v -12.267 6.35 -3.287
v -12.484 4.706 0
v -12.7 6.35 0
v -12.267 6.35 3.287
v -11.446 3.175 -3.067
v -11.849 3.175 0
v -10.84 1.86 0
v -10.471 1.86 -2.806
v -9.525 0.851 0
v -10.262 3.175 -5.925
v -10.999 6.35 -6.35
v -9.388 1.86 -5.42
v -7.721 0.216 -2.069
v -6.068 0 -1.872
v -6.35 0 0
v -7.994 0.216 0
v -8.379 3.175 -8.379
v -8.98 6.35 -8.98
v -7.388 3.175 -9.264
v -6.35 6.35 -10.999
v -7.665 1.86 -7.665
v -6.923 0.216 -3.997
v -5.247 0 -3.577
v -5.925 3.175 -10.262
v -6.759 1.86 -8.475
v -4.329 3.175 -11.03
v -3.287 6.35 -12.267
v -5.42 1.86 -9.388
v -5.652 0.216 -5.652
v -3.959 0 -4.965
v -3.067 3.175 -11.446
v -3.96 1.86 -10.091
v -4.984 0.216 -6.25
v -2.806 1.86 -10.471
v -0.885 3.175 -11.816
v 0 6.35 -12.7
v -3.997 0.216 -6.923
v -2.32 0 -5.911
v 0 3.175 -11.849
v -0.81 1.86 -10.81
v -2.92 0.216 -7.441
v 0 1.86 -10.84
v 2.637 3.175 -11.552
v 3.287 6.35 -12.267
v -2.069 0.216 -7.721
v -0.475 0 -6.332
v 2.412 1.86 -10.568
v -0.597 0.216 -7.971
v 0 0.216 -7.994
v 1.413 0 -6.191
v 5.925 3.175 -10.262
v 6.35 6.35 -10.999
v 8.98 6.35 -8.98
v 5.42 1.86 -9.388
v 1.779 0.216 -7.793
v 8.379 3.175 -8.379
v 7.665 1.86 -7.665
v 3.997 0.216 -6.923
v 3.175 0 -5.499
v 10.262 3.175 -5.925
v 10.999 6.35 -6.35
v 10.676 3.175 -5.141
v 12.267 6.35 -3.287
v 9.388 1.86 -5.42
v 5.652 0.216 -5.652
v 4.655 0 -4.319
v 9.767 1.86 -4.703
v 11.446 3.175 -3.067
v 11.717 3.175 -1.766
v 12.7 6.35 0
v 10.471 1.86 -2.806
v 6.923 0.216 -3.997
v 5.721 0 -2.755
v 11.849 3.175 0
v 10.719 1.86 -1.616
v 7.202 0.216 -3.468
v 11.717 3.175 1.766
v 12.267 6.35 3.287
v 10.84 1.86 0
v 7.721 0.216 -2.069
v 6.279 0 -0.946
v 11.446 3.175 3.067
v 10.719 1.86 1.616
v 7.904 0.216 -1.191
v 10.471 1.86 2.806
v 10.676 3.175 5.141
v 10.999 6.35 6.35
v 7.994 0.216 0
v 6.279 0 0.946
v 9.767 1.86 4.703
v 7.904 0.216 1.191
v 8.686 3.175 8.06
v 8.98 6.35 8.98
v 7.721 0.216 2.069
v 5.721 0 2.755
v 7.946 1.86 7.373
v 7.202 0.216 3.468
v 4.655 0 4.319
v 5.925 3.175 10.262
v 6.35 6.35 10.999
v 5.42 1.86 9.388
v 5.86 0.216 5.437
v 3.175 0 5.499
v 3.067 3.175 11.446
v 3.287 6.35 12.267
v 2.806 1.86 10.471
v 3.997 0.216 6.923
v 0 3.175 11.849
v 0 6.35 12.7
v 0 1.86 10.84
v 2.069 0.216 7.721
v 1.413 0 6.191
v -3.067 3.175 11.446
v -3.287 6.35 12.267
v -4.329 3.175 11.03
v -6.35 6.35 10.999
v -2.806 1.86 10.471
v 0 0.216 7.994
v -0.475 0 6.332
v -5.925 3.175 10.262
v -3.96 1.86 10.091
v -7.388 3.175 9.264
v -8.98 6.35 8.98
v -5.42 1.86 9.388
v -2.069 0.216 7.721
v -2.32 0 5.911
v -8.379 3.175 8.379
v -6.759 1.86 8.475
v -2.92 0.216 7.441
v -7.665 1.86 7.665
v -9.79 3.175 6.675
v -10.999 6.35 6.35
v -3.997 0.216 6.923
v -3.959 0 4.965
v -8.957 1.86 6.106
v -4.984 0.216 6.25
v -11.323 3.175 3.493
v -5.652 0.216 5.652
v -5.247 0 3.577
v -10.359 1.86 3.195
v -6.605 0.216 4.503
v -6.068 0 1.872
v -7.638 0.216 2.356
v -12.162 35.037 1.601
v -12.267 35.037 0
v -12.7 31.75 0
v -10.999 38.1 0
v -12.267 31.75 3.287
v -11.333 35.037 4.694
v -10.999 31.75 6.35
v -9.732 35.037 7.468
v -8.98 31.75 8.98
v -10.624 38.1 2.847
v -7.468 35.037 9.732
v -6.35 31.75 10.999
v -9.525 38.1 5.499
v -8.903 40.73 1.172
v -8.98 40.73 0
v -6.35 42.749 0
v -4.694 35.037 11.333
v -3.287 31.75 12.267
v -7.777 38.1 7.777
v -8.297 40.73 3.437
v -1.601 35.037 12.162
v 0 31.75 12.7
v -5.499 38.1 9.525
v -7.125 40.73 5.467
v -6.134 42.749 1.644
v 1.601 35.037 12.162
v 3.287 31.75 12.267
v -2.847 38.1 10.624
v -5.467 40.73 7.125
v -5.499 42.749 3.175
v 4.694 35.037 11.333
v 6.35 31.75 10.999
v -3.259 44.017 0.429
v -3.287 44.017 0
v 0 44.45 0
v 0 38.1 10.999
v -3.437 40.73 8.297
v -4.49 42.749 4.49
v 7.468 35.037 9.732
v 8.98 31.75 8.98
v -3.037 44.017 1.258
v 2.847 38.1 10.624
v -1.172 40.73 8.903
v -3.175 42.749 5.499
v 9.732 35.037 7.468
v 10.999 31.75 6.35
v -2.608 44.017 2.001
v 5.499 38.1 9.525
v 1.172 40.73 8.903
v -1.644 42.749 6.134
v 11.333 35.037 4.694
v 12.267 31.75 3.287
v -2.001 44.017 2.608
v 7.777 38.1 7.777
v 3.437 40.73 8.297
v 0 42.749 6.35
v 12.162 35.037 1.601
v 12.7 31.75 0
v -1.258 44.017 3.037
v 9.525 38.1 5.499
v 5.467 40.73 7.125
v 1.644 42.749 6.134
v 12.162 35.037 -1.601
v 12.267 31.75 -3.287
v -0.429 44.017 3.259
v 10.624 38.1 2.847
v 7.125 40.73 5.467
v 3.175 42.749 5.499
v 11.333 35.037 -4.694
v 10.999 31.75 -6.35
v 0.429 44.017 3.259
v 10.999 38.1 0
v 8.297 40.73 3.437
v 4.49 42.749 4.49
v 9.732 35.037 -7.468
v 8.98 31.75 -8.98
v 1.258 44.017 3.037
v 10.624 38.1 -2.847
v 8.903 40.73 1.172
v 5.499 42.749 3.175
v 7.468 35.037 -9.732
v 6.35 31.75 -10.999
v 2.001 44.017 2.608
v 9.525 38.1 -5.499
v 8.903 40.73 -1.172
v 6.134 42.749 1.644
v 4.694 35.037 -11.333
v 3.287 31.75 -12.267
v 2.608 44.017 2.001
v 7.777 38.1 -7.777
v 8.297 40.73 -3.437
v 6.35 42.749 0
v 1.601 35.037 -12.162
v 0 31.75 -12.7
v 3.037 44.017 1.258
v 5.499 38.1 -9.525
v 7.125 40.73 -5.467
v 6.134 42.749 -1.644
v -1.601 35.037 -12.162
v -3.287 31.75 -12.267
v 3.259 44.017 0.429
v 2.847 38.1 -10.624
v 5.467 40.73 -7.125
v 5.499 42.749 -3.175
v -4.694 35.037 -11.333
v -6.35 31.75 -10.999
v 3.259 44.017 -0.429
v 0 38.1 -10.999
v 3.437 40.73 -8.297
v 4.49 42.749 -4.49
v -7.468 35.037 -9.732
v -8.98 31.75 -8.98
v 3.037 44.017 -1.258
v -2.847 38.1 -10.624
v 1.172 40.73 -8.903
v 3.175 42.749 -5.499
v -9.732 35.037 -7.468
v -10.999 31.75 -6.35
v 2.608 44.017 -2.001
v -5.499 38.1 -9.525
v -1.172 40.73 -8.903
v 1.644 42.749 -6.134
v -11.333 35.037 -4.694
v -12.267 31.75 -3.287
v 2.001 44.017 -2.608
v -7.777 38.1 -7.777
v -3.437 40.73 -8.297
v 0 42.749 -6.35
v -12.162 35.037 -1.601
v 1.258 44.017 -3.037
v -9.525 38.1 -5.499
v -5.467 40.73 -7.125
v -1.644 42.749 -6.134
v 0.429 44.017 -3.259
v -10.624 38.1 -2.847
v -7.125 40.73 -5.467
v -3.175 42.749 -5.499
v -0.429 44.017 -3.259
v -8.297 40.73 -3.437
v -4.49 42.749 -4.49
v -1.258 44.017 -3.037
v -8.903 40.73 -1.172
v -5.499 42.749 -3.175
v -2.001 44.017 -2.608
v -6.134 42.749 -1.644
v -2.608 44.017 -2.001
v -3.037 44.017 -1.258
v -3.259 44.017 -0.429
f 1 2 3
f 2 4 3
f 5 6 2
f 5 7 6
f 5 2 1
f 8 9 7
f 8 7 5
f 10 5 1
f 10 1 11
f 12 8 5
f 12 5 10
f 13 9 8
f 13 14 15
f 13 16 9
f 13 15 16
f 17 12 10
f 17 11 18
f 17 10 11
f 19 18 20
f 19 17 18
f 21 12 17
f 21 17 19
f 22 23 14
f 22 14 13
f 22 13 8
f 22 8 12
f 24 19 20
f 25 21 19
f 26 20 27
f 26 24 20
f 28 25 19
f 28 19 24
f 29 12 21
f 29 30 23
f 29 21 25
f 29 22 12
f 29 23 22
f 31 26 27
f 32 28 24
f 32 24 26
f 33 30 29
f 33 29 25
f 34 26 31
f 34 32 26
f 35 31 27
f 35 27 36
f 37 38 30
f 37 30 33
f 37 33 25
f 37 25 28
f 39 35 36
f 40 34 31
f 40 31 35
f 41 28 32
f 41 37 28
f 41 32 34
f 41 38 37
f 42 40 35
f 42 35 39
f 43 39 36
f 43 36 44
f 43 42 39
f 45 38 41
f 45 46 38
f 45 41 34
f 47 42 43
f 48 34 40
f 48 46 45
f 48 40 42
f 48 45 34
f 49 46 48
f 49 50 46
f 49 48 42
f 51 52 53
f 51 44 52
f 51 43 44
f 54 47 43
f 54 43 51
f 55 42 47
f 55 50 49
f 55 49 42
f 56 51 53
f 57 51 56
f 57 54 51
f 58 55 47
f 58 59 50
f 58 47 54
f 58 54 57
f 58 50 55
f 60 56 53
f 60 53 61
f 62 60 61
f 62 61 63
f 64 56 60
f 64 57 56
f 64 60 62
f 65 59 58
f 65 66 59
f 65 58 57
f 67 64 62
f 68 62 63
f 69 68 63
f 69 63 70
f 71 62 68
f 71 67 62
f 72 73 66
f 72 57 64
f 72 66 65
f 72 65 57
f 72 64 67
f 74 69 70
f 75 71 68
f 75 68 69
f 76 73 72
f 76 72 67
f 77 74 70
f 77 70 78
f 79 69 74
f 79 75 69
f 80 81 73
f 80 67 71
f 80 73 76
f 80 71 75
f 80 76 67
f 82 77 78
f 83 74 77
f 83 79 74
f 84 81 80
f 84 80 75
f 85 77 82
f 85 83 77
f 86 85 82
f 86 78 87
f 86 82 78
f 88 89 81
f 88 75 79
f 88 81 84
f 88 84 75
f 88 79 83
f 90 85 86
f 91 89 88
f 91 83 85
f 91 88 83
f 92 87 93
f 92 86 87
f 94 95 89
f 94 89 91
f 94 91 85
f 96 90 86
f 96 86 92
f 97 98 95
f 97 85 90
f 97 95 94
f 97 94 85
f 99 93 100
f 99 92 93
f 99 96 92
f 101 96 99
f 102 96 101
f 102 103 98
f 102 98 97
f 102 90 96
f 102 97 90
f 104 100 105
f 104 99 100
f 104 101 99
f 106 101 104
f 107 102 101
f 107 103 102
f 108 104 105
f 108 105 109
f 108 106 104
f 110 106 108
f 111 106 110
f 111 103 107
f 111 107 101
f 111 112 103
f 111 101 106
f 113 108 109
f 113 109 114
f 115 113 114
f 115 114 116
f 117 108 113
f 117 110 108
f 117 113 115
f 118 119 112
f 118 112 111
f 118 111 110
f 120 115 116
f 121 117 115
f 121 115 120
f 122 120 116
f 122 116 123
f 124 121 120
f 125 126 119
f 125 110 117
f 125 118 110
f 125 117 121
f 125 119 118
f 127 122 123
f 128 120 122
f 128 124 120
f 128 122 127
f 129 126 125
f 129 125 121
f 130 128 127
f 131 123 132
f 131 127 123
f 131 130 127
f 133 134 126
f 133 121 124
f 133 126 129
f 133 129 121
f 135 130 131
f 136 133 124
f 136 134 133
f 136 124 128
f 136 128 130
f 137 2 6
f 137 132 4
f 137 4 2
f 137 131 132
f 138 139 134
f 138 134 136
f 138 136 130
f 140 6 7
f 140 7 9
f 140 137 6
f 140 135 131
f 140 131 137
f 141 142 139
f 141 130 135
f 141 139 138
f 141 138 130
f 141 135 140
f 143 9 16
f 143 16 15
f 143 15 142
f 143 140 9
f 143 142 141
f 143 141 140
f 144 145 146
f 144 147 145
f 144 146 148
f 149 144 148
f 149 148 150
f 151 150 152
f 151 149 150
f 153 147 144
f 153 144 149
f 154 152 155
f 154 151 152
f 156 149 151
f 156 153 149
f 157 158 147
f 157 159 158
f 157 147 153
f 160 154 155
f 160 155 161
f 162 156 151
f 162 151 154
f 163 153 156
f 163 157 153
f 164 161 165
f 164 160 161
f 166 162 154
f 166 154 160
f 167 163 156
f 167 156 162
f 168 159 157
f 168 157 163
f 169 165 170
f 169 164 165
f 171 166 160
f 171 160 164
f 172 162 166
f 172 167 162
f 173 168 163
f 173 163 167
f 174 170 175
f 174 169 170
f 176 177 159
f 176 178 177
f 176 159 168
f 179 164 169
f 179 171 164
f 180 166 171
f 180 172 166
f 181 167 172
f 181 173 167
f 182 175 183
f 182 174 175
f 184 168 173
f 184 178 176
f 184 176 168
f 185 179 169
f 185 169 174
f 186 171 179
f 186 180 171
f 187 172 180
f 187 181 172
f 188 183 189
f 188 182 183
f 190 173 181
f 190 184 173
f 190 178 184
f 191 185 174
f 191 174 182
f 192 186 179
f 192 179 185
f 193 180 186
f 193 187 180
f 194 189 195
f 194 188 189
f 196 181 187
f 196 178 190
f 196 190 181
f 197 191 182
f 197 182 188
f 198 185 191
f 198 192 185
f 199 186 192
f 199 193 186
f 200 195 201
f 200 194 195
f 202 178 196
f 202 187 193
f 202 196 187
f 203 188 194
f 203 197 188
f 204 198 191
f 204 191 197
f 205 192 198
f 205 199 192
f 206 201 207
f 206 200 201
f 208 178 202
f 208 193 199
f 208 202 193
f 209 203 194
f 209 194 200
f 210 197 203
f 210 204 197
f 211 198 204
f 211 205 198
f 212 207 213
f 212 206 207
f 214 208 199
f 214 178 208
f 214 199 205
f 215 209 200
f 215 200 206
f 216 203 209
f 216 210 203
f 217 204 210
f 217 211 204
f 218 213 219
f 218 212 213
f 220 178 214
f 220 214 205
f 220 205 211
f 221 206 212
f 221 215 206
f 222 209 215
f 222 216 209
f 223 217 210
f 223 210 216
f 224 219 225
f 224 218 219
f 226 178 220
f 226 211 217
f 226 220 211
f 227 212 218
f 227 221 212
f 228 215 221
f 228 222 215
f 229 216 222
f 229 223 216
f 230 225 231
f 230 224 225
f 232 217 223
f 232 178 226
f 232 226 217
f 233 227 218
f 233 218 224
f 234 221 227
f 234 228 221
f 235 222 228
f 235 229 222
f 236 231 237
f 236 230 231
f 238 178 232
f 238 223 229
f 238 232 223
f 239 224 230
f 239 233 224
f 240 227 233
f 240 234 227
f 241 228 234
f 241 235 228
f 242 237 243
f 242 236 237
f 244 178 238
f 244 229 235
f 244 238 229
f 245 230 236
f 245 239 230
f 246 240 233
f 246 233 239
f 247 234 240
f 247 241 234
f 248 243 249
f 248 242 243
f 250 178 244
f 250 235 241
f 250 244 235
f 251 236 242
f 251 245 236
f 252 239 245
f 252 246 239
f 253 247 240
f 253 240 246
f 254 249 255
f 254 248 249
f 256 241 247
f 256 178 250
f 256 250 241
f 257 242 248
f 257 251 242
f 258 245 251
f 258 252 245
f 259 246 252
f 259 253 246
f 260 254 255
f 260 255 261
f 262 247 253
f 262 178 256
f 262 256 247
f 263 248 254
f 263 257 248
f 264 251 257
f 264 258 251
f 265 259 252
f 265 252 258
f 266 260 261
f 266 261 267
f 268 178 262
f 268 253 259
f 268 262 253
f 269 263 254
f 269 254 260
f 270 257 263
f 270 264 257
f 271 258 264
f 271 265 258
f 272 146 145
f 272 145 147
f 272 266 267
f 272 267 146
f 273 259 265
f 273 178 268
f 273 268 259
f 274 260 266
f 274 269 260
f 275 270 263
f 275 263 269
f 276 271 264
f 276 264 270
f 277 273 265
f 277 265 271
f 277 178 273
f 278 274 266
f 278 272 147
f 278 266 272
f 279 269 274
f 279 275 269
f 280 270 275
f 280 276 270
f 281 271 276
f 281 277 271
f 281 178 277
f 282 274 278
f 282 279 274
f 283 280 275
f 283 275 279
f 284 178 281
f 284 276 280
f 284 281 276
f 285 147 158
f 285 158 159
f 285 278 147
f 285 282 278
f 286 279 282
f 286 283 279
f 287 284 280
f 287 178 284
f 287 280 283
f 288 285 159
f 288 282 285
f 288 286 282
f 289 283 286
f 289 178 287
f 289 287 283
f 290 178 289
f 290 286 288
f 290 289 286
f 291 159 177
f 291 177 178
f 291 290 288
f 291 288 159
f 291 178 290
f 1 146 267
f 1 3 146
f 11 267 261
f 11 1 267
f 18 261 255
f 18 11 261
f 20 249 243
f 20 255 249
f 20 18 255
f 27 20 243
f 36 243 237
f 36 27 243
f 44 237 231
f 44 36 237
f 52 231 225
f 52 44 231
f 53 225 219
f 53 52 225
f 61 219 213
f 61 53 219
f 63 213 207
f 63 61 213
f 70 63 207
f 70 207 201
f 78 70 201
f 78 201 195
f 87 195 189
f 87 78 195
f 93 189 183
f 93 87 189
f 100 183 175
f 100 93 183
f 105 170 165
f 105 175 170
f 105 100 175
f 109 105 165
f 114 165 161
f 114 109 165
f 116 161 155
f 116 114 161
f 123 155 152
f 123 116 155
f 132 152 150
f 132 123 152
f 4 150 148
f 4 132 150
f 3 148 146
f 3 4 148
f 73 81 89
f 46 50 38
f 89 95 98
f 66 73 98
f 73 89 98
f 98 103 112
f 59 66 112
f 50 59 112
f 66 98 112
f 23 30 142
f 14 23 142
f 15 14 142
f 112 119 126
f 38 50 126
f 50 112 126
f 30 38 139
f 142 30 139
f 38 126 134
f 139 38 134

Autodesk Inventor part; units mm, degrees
ref_plane "YZ Plane" through (0, 0, 0) normal (1, 0, 0) x (0, 1, 0)
ref_plane "XZ Plane" through (0, 0, 0) normal (0, 1, 0) x (-1, 0, 0)
ref_plane "XY Plane" through (0, 0, 0) normal (0, 0, 1) x (1, 0, 0)
sketch "Sketch1" plane through (0, 0, 0) normal (0, 1, 0) x (-1, 0, 0)
  circle A0 centre (0, 0) radius 12.7
  point P0 (0, -12.7)
  dimension "d0" = 25.4
extrude "Extrusion1" add sketch "Sketch1" along normal blind 44.45
fillet "Fillet1" radius 12.7 1 edges at (12.7, 44.45, 0)
fillet "Fillet2" radius 6.35 1 edges at (12.7, 0, 0)
properties part number "minion-body" material "PAEK Plastic"
